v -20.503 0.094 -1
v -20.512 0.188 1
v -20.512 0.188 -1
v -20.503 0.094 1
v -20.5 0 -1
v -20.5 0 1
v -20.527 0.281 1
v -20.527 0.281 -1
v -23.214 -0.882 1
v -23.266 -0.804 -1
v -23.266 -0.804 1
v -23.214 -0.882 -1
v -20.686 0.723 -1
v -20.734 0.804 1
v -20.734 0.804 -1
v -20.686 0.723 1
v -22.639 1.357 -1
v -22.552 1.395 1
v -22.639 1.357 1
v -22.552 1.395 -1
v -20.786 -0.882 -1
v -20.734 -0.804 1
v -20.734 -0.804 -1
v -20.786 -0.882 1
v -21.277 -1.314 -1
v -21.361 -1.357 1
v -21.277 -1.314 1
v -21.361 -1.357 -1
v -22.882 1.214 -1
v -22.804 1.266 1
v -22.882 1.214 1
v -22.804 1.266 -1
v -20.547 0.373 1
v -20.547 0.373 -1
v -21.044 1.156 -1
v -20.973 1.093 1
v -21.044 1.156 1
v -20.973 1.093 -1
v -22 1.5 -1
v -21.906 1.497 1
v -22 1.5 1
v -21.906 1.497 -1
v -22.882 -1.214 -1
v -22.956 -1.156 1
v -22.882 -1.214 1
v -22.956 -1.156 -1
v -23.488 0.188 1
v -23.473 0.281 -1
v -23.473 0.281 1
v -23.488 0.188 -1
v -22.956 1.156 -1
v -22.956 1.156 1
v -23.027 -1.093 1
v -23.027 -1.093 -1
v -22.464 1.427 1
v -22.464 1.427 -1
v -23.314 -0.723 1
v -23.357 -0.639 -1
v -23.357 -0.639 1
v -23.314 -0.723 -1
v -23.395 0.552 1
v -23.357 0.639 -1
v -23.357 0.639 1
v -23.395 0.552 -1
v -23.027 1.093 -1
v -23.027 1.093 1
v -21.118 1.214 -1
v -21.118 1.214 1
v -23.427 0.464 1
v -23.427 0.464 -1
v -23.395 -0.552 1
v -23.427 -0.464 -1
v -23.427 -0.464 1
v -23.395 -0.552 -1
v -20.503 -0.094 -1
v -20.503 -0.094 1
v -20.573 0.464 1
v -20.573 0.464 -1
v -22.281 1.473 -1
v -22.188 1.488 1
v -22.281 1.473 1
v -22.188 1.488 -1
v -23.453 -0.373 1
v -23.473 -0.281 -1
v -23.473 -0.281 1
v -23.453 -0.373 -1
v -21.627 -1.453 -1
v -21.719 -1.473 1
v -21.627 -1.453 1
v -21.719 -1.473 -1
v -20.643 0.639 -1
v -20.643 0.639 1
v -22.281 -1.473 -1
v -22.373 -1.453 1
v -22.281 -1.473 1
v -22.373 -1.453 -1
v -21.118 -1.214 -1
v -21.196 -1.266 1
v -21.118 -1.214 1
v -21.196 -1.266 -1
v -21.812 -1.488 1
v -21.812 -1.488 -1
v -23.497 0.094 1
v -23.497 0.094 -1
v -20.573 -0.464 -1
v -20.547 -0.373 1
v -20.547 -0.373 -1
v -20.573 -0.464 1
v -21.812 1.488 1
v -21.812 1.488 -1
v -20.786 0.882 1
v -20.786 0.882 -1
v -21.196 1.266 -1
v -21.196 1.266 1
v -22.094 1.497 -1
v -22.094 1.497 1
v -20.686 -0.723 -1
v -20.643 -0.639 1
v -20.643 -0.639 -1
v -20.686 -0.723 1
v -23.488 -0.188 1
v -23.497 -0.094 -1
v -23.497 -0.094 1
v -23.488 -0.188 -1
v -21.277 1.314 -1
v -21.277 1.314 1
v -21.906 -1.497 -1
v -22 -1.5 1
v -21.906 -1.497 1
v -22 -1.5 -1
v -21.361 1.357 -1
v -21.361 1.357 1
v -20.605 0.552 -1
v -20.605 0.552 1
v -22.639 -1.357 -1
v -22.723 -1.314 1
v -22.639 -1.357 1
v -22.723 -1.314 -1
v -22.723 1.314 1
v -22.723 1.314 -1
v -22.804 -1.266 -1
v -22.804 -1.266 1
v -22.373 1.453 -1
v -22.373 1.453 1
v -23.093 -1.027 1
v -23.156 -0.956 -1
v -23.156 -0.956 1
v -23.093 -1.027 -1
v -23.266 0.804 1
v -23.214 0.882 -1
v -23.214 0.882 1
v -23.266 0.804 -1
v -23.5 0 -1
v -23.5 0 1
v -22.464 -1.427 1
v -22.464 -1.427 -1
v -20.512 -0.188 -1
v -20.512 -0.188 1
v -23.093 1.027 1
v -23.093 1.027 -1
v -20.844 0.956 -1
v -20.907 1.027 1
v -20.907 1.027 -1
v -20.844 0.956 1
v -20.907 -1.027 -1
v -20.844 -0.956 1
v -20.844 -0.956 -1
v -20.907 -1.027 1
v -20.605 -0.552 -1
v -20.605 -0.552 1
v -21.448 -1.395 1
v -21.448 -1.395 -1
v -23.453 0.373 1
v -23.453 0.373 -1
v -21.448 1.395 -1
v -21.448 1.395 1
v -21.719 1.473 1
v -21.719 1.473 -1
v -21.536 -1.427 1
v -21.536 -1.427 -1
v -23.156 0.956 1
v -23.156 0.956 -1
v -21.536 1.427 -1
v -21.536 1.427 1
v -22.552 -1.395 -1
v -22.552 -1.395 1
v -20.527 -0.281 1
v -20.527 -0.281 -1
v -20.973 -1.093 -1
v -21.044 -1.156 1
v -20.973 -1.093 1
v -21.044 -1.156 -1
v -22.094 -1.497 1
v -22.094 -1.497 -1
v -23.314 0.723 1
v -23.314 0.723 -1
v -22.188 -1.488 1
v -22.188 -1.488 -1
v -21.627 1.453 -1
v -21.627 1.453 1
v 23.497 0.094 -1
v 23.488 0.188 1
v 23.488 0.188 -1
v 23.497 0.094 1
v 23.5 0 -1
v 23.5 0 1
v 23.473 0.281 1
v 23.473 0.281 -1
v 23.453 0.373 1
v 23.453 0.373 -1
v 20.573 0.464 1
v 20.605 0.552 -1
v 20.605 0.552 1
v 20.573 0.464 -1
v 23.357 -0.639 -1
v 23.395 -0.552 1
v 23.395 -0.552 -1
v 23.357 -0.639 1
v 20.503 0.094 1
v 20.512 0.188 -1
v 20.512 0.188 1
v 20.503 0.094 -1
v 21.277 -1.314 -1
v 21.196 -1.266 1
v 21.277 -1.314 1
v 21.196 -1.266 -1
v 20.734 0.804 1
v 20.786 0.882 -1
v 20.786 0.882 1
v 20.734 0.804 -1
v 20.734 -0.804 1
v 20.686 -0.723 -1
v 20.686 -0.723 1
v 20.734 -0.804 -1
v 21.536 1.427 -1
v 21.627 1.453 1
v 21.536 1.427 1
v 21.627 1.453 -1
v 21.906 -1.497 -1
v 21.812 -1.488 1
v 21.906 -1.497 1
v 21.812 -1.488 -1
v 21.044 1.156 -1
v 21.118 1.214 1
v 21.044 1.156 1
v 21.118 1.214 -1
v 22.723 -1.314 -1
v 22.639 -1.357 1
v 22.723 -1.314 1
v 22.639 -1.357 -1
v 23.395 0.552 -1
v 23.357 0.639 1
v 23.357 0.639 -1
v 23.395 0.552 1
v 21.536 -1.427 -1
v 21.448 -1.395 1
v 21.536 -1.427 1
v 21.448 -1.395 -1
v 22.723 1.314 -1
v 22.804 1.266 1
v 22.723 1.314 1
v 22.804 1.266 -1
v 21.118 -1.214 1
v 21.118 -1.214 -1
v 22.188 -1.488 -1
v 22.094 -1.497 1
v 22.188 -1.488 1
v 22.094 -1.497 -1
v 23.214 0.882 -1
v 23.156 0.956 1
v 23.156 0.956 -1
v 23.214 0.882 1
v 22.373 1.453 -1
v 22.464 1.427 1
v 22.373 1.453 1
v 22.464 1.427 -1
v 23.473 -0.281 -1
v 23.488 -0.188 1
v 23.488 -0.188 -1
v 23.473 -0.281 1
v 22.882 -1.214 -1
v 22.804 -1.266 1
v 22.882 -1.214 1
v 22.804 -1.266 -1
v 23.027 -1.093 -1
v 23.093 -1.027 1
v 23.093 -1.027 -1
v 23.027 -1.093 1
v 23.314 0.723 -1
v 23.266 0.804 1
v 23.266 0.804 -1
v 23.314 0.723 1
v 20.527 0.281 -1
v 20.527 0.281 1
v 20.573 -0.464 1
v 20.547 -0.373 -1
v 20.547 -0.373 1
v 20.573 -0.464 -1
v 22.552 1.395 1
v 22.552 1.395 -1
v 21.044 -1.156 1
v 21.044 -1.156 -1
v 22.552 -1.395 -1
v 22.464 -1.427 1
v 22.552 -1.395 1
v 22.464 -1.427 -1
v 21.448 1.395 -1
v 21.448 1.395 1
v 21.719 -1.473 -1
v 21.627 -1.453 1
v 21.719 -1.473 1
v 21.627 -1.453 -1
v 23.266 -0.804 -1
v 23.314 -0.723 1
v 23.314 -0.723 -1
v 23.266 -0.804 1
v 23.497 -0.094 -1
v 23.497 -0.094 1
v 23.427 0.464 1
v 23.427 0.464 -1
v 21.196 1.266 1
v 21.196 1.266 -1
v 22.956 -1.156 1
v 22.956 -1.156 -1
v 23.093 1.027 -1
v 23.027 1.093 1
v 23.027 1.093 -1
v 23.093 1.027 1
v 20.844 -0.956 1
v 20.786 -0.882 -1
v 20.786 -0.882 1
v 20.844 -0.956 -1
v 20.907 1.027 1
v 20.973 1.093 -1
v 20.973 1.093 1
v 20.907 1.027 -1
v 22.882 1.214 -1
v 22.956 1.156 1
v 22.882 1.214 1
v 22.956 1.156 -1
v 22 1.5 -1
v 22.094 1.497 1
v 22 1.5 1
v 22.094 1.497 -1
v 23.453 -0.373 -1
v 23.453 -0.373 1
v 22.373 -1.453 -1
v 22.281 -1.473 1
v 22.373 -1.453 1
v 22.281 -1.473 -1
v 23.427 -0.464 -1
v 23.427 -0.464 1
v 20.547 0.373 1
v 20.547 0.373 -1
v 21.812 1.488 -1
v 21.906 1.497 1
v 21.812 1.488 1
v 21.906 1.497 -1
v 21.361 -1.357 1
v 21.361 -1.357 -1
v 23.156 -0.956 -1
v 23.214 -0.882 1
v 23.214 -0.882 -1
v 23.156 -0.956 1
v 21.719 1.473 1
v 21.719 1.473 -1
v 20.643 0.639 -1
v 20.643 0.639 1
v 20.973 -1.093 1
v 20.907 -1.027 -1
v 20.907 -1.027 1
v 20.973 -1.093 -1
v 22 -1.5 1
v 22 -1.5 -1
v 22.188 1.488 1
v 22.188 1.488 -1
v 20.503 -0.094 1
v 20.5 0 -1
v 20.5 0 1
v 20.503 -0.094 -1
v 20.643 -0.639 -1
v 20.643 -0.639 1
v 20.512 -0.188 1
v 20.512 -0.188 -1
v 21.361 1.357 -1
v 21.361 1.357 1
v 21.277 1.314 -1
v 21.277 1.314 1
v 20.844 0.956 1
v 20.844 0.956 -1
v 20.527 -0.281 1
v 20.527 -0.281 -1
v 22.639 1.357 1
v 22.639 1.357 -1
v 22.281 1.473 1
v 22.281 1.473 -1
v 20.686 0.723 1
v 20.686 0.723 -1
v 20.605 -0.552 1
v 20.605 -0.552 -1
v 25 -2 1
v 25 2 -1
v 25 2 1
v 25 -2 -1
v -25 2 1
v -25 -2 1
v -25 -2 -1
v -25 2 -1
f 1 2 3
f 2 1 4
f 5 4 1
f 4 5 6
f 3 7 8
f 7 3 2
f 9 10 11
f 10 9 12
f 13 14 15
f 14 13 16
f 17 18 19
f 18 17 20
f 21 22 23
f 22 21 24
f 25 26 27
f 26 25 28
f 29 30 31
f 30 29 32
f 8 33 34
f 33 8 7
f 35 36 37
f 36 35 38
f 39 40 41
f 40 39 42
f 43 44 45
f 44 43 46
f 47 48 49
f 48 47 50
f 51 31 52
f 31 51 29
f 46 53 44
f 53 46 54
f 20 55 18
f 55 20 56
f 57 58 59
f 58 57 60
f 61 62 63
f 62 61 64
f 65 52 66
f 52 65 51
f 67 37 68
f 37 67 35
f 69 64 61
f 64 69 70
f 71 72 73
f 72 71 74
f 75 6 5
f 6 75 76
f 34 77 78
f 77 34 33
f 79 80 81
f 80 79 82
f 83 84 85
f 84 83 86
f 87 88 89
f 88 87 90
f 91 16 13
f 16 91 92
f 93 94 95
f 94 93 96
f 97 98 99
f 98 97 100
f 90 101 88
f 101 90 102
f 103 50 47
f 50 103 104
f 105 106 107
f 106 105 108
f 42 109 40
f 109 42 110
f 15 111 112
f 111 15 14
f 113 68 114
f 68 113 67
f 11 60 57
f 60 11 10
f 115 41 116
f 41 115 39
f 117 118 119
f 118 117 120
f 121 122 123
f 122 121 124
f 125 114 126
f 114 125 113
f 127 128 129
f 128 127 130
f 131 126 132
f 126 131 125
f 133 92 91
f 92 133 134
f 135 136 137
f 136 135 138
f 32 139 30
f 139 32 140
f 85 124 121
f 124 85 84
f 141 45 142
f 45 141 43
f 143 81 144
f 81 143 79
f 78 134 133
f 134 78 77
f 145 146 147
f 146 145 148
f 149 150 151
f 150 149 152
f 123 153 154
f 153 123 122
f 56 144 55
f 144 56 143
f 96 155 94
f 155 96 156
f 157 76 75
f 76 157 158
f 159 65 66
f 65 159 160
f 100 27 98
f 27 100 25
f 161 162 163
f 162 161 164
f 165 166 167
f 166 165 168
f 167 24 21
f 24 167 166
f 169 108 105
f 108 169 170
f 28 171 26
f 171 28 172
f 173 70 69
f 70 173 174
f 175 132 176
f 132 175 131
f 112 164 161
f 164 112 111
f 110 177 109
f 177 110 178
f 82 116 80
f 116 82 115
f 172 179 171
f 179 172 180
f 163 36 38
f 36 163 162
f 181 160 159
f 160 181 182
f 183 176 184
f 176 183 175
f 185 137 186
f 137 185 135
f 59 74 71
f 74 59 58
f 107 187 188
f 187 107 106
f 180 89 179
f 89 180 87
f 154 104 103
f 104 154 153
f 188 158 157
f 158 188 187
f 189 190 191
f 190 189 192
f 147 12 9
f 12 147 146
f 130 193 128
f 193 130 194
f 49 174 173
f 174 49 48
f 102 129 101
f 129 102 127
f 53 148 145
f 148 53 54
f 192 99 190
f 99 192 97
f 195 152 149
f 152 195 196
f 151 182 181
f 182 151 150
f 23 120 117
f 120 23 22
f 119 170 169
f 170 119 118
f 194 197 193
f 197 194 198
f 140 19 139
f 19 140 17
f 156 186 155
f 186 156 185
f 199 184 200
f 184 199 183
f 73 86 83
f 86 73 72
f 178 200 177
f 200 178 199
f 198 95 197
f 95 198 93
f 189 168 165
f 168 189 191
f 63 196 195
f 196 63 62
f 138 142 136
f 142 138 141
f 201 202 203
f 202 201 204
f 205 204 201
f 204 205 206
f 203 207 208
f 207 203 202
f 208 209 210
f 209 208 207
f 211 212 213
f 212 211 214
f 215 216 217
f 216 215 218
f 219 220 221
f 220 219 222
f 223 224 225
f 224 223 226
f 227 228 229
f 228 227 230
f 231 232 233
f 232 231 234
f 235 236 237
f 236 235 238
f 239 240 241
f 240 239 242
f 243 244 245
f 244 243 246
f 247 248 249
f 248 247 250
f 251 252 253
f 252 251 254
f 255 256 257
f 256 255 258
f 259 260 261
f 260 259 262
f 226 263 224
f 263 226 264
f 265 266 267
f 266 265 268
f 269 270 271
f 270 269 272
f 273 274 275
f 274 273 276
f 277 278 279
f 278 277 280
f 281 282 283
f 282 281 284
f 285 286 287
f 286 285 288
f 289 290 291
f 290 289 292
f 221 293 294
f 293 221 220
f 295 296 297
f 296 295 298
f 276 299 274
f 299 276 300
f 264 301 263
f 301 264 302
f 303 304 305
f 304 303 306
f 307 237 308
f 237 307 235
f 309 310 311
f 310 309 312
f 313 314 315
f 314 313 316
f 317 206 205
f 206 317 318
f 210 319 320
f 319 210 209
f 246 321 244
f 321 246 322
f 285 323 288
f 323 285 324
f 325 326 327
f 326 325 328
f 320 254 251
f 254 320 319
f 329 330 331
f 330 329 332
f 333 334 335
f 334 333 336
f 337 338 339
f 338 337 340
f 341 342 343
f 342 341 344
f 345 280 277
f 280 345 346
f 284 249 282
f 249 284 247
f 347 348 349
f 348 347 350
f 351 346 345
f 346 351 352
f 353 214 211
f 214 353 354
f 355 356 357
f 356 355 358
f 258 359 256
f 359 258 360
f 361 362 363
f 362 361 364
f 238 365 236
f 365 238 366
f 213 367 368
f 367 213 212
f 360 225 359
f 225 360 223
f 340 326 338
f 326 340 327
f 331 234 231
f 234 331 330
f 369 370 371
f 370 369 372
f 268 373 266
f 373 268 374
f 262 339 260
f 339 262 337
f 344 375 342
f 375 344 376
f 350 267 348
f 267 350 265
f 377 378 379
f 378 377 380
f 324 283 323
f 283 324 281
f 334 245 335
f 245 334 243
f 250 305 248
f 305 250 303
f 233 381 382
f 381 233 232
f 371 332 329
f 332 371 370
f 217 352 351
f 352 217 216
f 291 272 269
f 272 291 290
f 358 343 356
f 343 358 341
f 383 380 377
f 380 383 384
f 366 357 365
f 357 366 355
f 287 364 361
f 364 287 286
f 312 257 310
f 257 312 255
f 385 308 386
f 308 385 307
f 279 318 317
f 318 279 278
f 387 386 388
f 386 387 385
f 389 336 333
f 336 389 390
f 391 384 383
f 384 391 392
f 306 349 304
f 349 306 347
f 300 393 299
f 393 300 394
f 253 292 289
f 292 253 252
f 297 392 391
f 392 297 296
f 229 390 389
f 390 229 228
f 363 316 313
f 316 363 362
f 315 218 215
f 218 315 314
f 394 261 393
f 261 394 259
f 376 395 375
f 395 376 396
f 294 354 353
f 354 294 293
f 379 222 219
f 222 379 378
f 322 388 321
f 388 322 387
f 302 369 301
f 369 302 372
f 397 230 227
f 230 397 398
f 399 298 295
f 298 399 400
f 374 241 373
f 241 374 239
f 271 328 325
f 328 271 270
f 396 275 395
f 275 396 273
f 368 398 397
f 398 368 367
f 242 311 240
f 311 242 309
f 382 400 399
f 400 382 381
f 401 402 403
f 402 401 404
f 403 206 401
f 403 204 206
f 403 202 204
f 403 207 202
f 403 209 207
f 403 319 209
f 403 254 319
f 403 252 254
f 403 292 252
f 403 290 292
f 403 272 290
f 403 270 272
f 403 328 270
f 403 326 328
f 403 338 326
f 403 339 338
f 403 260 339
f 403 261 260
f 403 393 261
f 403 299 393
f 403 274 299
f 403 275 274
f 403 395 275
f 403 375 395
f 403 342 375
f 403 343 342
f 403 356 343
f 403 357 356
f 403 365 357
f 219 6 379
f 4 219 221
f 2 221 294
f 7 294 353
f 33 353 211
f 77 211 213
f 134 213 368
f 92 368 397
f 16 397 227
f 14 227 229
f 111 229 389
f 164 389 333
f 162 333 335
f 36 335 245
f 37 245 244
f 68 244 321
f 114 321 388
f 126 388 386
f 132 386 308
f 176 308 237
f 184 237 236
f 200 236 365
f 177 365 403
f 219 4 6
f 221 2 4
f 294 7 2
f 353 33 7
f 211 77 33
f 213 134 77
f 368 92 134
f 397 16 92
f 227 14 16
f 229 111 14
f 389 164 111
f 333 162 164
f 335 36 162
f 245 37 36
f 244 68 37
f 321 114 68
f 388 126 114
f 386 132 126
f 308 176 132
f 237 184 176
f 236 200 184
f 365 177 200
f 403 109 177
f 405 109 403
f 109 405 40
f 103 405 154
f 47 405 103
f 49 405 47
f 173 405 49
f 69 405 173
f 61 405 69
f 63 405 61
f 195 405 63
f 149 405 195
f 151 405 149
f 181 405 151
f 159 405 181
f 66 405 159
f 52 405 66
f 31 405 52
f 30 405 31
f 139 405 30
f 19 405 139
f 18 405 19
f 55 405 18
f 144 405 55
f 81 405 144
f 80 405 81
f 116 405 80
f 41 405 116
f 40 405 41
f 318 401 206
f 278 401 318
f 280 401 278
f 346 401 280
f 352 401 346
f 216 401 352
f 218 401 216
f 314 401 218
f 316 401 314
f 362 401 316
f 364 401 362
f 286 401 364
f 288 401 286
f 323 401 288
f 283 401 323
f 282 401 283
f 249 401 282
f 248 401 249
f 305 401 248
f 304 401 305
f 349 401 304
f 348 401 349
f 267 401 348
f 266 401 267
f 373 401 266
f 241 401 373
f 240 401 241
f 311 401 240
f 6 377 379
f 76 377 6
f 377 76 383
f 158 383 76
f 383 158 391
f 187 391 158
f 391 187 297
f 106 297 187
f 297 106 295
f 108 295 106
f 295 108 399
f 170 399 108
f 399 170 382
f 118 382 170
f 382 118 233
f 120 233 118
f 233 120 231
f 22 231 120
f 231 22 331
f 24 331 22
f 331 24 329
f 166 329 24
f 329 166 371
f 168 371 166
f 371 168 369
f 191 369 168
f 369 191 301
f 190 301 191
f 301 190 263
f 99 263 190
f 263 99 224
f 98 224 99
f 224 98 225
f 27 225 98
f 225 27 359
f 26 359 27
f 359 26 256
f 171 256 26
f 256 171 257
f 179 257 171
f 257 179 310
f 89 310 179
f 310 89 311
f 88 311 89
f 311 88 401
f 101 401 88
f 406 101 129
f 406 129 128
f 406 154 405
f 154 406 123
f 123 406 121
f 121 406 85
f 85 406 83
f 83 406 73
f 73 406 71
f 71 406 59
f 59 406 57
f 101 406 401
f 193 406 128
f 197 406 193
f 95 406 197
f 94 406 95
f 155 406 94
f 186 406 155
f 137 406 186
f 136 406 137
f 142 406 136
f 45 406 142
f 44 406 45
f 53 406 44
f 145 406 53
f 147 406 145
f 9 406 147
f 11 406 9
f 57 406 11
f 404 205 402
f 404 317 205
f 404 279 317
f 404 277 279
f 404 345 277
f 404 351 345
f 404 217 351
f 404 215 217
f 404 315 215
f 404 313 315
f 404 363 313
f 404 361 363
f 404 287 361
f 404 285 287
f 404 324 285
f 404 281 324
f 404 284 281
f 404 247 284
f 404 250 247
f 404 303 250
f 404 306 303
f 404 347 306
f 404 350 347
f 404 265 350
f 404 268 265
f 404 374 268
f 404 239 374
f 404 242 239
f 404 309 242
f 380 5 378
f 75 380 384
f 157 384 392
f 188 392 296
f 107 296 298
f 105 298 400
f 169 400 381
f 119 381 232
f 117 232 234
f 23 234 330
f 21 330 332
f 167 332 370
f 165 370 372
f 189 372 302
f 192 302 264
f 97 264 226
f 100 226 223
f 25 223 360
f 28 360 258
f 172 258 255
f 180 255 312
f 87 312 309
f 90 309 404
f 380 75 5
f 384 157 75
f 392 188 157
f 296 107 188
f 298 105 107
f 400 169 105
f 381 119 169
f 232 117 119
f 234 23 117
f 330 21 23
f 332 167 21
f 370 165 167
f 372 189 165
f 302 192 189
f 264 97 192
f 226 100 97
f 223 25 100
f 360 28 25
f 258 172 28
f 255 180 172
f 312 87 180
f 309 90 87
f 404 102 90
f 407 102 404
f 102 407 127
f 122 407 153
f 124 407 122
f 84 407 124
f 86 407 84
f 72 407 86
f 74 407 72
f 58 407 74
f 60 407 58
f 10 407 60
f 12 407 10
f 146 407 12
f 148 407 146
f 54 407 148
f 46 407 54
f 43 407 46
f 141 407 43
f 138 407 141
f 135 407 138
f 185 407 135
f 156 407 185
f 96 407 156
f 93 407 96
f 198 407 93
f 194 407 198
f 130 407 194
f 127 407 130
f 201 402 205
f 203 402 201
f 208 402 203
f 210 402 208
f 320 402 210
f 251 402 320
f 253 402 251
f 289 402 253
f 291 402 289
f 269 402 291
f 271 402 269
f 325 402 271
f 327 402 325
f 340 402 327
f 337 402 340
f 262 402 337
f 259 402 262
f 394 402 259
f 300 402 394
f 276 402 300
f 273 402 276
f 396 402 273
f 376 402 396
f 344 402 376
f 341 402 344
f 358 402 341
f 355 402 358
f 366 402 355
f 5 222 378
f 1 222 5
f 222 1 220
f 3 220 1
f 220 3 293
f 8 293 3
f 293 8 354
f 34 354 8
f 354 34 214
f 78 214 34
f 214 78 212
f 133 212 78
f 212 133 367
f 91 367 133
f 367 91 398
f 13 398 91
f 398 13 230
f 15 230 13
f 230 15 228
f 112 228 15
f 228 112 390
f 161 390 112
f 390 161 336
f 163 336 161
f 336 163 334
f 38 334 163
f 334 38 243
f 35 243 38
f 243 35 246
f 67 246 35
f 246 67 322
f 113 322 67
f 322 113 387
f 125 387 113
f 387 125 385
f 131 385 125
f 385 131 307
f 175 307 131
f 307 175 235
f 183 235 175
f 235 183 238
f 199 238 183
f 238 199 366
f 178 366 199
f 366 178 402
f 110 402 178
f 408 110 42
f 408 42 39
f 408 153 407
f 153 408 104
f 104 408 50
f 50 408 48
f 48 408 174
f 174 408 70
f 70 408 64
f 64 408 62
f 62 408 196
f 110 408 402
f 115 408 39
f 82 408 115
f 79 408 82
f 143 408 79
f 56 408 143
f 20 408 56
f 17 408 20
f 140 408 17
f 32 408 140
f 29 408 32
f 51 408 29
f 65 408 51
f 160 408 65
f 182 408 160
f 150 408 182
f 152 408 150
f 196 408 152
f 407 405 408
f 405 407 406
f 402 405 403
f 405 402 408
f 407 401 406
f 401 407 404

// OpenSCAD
difference() {

	cube([50,4,2], center=true);

	for (x = [-22,22]){
		translate([x,0,-2]){
			cylinder(h=4,r=1.5, $fn=100);
		}
	}
}
